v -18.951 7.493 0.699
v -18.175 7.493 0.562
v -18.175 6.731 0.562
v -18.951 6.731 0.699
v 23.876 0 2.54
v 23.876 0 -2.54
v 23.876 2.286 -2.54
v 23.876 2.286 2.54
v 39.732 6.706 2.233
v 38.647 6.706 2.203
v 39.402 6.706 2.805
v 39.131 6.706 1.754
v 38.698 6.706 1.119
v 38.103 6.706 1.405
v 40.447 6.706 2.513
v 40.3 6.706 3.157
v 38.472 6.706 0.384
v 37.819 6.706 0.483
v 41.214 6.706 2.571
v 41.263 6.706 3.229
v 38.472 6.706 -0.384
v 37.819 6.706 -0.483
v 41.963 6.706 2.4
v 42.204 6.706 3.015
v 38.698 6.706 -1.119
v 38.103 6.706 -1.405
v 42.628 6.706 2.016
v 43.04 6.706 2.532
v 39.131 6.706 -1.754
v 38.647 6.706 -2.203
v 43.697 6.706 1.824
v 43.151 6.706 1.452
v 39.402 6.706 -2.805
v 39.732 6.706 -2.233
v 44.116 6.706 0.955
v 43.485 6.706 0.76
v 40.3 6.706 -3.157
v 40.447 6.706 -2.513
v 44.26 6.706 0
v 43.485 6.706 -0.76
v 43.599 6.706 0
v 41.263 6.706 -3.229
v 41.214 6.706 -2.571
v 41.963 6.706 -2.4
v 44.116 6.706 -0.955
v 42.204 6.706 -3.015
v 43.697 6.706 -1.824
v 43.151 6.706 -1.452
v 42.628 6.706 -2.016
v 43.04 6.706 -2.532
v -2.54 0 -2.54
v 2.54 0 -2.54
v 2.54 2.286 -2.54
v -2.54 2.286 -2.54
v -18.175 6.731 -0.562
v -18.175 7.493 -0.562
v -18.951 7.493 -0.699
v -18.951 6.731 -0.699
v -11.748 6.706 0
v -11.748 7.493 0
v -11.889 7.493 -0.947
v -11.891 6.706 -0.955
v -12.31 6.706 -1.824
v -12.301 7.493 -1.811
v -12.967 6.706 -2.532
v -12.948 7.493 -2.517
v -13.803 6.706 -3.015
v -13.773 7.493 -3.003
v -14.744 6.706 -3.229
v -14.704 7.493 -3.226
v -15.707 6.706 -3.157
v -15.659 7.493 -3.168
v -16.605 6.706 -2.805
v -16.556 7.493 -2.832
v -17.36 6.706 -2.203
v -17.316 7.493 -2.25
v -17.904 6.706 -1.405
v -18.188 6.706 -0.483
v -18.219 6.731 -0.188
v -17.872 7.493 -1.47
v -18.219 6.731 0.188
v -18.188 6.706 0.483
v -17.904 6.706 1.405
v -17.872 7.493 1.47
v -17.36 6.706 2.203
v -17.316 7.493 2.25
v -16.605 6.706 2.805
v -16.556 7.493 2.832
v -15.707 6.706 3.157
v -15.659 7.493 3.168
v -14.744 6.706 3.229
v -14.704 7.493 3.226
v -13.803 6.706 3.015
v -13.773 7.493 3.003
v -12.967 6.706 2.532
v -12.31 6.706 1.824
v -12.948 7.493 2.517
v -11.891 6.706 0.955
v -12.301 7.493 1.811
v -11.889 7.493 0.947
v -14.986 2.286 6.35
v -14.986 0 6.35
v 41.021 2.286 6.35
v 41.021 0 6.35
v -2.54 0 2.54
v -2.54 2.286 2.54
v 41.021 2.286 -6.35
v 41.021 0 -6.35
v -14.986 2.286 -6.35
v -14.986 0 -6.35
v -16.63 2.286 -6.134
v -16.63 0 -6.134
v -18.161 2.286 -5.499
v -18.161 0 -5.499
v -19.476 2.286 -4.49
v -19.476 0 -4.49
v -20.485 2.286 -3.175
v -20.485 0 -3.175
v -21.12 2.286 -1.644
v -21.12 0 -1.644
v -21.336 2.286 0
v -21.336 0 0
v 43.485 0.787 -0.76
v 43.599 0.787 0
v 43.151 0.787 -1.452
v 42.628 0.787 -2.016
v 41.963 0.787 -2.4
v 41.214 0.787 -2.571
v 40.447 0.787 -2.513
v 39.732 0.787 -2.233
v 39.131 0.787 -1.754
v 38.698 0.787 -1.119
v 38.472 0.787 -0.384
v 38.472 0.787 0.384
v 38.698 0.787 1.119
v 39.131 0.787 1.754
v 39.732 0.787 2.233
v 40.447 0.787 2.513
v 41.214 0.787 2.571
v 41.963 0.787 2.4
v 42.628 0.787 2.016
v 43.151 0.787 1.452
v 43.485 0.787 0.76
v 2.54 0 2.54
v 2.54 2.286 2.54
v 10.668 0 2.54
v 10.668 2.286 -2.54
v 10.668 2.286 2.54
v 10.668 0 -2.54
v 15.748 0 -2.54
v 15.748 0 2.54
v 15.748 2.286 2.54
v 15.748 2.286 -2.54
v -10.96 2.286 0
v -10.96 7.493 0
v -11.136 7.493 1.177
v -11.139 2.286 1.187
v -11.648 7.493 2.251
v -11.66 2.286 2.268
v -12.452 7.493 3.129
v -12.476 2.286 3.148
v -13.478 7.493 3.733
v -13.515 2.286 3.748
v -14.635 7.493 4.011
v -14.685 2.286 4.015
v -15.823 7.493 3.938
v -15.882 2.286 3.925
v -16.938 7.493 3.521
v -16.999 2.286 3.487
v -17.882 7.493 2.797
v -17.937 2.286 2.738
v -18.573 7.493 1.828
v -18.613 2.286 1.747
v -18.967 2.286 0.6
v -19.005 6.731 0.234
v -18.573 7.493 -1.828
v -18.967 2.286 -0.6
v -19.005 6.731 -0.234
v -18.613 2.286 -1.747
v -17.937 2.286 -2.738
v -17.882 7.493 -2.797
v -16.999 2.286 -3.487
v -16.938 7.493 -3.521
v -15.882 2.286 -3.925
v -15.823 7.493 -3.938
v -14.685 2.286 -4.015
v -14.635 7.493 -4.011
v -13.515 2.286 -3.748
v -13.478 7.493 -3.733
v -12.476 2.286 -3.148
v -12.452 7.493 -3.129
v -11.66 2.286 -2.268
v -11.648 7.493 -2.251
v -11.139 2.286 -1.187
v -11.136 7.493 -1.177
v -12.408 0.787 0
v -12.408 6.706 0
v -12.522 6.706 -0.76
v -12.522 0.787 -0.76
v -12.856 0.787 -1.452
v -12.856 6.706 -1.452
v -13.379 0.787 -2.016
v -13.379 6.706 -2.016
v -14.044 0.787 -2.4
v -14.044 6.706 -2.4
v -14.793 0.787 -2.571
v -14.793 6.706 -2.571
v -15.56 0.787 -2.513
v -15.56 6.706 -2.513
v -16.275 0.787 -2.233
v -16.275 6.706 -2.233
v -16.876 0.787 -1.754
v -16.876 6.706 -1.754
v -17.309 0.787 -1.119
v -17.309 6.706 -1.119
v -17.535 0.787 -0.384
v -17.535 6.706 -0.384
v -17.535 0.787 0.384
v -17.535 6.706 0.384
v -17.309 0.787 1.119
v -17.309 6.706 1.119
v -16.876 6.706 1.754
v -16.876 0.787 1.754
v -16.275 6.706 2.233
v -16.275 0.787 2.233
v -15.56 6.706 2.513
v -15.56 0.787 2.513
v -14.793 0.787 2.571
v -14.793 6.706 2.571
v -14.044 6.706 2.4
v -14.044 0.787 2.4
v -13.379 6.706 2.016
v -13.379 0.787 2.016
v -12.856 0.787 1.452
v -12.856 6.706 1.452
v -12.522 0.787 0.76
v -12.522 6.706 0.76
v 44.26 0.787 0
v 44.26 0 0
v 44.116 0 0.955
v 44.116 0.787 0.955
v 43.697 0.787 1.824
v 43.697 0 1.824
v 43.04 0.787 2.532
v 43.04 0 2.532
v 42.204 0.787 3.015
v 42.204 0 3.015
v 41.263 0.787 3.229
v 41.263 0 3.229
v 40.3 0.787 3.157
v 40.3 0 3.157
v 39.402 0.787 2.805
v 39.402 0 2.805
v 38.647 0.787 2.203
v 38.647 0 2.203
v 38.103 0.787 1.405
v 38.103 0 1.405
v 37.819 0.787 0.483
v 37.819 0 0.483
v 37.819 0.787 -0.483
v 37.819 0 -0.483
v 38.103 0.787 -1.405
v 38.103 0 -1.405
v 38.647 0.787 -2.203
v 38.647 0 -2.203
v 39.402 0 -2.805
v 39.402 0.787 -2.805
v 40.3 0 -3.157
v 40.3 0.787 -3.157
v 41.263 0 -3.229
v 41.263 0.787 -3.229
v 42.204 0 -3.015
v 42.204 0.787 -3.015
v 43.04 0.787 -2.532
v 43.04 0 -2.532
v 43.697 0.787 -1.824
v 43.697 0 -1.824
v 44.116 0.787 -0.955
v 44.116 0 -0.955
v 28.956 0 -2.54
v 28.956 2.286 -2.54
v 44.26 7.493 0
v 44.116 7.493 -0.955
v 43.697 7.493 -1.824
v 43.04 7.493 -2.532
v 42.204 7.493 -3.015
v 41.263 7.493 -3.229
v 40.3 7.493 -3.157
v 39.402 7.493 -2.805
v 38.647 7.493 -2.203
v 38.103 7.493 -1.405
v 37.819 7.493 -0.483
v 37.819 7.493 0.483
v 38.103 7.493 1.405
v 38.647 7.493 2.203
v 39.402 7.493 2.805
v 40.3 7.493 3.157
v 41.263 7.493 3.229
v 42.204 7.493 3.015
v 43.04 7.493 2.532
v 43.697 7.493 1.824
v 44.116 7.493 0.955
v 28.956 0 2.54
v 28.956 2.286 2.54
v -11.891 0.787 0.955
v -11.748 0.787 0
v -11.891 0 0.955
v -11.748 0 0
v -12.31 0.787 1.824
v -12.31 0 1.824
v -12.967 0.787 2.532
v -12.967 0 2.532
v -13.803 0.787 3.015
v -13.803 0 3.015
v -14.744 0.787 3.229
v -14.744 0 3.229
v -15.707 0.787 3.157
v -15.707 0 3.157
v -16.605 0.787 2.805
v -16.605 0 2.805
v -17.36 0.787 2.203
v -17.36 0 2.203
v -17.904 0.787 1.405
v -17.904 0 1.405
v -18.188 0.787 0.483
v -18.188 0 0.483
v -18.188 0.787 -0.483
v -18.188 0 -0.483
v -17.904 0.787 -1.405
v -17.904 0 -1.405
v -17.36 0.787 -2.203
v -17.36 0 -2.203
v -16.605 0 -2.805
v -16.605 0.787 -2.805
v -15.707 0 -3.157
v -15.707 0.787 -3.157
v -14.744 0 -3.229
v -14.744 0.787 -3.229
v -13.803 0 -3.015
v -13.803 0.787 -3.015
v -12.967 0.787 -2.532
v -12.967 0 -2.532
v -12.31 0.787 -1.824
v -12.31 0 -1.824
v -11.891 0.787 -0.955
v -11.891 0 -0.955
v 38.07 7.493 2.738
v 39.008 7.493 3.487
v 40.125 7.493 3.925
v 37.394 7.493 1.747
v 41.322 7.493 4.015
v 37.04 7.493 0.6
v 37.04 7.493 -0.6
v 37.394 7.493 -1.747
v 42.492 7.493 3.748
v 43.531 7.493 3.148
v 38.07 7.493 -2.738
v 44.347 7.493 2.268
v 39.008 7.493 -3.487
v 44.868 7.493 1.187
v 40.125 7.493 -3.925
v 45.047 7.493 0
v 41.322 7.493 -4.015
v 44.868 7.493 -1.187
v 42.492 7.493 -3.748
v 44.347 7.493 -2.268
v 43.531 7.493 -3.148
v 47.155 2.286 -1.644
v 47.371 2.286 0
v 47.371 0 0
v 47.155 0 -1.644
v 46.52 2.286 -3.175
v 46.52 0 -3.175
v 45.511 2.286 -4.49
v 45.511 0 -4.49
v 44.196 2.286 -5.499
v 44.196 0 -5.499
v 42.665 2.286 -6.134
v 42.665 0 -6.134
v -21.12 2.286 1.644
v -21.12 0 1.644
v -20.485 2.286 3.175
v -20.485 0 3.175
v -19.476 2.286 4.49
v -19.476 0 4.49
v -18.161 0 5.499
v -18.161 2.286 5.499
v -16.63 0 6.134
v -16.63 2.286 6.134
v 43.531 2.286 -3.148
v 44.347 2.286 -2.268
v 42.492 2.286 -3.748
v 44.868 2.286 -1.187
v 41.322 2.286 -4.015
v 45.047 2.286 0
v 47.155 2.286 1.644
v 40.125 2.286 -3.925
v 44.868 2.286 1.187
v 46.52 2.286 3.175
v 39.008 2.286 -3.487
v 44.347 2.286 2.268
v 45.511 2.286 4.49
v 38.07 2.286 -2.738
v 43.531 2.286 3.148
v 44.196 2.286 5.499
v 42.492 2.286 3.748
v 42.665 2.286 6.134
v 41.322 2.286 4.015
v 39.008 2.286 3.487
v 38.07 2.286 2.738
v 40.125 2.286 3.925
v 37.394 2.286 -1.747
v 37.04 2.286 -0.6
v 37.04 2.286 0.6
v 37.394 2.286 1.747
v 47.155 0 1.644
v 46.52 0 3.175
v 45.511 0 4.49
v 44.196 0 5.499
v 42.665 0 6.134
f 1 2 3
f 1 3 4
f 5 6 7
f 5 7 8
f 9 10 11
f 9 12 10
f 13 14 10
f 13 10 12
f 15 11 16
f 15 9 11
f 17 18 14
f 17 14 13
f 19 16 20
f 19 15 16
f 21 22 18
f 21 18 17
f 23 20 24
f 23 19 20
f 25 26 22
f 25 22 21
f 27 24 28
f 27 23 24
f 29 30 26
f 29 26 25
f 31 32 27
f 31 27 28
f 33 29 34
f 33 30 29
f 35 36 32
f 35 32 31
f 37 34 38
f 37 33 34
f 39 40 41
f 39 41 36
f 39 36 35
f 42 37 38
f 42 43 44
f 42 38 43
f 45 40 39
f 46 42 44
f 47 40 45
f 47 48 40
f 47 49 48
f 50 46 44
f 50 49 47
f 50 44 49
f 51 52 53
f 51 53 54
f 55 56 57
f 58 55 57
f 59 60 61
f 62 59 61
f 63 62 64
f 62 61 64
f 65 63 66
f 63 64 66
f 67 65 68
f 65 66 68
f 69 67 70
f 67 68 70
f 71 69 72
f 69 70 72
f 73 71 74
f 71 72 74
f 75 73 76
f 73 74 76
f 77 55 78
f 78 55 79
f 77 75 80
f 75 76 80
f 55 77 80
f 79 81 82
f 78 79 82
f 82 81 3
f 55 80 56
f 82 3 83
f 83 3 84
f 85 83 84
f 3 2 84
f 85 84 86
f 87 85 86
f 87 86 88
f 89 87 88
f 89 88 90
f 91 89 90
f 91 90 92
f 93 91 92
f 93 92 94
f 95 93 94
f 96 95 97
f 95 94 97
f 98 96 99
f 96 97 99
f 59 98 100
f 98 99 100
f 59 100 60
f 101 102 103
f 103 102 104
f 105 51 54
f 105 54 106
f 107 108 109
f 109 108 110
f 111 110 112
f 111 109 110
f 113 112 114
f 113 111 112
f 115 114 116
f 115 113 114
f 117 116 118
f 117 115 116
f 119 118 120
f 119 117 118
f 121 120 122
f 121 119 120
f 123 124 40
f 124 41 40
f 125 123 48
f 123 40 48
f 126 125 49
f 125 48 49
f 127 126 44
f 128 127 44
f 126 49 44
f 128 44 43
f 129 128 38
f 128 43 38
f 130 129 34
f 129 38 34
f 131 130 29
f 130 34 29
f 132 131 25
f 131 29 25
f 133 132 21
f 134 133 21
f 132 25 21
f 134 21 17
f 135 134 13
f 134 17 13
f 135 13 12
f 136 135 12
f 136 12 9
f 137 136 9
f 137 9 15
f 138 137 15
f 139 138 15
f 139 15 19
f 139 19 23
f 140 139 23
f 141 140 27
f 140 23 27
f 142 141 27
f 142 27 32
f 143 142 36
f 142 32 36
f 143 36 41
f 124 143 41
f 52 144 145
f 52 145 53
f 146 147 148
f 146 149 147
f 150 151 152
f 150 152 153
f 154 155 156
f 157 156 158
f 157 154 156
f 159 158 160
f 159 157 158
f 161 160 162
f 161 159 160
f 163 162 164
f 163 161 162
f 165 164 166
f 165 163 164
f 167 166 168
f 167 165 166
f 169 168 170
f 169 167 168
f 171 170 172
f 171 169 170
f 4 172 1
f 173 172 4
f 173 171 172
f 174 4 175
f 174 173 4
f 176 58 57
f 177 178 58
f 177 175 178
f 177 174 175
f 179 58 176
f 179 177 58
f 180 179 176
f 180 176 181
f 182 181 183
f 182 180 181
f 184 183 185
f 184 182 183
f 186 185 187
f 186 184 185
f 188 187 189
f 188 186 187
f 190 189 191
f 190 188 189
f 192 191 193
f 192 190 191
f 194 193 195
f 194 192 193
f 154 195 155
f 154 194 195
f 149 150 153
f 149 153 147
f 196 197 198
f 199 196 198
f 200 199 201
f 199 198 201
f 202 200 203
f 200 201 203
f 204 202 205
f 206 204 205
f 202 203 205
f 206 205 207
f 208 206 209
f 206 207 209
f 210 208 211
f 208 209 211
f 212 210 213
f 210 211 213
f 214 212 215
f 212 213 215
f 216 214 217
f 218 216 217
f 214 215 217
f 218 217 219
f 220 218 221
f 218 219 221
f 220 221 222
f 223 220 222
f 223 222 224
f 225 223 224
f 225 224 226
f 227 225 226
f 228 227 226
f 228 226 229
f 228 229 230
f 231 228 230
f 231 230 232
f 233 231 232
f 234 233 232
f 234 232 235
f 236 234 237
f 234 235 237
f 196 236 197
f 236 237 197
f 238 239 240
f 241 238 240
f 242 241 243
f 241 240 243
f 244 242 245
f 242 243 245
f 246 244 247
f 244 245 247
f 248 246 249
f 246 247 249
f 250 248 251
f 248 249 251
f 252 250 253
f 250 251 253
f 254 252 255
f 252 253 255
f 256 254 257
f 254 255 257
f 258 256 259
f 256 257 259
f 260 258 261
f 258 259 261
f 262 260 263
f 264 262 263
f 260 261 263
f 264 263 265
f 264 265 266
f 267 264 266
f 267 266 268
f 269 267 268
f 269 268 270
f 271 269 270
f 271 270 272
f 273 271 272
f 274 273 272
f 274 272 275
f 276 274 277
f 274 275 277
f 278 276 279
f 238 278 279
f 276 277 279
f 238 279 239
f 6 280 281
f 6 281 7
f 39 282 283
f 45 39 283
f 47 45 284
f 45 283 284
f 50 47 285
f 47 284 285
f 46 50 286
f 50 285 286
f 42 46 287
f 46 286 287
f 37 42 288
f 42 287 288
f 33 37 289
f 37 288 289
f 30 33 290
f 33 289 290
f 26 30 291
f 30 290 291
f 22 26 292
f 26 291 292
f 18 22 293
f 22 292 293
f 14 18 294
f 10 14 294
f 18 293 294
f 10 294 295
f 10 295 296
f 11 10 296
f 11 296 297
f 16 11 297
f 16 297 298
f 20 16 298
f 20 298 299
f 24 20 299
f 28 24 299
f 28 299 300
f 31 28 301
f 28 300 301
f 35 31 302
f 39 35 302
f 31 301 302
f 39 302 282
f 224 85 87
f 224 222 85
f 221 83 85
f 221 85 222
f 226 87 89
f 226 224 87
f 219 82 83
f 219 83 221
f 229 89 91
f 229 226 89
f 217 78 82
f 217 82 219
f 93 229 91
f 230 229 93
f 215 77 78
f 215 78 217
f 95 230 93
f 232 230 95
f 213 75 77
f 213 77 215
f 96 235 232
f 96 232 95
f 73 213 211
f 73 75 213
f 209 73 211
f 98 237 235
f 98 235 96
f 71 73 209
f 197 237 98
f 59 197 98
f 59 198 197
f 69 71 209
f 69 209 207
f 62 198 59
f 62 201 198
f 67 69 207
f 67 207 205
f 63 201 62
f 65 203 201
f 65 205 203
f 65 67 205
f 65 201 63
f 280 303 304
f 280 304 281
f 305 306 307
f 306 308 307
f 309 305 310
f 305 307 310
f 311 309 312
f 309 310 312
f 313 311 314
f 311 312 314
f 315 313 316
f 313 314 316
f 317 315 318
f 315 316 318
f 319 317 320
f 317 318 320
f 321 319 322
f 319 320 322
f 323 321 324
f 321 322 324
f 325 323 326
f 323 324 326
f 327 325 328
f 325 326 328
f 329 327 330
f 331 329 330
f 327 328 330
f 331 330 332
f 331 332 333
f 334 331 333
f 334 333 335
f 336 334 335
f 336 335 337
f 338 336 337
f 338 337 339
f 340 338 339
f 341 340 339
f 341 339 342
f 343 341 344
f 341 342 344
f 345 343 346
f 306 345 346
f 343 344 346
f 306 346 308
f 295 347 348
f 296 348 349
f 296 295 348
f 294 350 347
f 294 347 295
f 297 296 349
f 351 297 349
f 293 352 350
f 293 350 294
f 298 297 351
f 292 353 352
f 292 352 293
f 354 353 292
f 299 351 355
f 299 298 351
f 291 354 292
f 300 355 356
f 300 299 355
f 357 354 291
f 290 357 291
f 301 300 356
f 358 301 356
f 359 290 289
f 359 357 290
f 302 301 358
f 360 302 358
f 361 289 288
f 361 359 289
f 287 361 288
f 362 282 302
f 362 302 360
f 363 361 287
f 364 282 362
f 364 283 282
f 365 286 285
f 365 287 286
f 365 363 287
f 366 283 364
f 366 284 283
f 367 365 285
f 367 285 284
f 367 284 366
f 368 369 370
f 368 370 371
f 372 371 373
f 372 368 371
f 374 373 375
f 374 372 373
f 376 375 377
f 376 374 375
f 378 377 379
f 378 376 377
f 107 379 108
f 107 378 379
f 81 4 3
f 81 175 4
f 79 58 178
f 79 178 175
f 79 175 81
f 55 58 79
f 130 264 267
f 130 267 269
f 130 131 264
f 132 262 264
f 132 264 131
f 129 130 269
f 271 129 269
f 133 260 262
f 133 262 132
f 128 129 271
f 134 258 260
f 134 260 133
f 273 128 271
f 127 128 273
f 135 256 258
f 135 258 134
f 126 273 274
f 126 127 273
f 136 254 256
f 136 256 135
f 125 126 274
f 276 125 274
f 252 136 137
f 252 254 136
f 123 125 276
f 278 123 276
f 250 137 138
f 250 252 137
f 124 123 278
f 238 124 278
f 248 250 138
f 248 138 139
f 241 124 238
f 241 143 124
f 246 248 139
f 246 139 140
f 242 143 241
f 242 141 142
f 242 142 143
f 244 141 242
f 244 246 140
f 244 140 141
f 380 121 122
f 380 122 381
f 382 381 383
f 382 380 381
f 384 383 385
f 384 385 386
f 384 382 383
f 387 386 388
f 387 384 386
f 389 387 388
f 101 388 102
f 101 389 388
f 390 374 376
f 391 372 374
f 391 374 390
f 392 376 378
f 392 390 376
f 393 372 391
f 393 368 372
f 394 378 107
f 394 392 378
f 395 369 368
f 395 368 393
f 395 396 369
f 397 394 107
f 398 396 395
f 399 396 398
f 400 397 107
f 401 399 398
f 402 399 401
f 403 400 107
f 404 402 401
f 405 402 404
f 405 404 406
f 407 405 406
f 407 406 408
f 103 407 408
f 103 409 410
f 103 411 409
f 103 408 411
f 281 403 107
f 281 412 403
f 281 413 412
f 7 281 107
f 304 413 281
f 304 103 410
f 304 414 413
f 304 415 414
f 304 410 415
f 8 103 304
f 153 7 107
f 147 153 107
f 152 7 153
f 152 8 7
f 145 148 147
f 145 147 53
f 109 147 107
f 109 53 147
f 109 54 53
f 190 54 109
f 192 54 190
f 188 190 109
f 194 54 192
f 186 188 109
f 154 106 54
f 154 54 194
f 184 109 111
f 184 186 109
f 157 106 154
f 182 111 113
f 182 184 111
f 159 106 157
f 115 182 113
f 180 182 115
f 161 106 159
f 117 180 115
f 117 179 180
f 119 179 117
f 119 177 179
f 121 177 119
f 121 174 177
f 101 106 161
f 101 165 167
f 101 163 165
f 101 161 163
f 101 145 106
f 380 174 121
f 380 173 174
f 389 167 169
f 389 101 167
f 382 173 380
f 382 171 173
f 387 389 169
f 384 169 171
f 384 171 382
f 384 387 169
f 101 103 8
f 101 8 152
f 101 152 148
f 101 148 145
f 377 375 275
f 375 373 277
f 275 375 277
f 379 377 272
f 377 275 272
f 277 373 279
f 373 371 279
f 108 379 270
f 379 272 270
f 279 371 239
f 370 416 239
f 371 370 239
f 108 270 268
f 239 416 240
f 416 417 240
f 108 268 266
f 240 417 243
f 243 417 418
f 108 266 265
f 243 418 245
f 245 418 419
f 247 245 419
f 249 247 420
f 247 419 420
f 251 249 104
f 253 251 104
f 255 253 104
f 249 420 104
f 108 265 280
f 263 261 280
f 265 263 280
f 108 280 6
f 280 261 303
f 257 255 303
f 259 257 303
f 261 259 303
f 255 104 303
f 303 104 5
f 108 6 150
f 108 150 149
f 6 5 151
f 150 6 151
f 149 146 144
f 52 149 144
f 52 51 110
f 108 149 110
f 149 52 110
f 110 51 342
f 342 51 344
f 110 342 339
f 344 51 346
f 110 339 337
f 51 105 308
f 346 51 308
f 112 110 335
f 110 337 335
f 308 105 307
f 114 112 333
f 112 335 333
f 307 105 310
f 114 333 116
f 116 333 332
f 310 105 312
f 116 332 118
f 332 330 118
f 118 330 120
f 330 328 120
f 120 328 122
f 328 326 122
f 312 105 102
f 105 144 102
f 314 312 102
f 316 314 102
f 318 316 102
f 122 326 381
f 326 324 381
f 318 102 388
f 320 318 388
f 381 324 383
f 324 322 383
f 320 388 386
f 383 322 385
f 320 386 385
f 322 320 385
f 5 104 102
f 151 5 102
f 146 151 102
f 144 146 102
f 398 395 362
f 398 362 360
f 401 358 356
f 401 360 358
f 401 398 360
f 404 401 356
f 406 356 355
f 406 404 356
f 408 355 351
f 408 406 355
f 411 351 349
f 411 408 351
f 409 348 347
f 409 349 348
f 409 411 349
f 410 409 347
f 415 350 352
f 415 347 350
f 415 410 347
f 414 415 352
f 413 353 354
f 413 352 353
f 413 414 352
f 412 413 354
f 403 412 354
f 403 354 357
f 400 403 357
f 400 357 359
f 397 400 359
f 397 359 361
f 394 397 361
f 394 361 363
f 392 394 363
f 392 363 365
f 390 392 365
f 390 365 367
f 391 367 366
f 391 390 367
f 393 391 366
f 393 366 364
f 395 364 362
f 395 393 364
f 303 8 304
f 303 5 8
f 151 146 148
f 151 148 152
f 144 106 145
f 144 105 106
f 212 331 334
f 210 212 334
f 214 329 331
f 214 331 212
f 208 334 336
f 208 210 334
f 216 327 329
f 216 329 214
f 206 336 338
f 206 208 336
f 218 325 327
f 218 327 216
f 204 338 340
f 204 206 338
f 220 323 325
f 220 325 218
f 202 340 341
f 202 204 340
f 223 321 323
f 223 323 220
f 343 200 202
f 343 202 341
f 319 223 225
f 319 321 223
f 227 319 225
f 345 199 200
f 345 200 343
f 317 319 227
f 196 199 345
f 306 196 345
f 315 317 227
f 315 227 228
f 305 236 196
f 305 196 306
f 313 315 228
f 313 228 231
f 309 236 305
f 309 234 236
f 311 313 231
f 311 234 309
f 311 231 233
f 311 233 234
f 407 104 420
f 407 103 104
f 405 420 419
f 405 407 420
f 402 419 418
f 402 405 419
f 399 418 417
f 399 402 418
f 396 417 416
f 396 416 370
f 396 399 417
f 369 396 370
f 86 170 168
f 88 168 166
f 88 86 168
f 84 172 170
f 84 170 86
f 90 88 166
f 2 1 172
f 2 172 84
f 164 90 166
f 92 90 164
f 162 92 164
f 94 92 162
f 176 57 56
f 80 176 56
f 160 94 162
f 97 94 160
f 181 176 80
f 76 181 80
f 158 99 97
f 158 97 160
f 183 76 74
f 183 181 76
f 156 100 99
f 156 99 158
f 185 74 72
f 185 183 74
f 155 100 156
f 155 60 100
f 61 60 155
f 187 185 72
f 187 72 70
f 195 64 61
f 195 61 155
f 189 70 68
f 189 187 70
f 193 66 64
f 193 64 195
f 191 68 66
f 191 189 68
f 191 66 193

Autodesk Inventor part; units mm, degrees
ref_plane "YZ Plane" through (0, 0, 0) normal (1, 0, 0) x (0, 1, 0)
ref_plane "XZ Plane" through (0, 0, 0) normal (0, 1, 0) x (-1, 0, 0)
ref_plane "XY Plane" through (0, 0, 0) normal (0, 0, 1) x (1, 0, 0)
sketch "Sketch1" plane through (0, 0, 0) normal (0, 1, 0) x (-1, 0, 0)
  line L0 (21.336, 6.35) -> (-47.371, 6.35)
  line L1 (-47.371, 6.35) -> (-47.371, -6.35)
  line L2 (-47.371, -6.35) -> (21.336, -6.35)
  line L3 (21.336, -6.35) -> (21.336, 6.35)
  line L4 (-2.54, -2.54) -> (2.54, -2.54)
  line L5 (2.54, -2.54) -> (2.54, 2.54)
  line L6 (2.54, 2.54) -> (-2.54, 2.54)
  line L7 (-2.54, 2.54) -> (-2.54, -2.54)
  line L8 (-2.54, -2.54) -> (2.54, 2.54) construction
  line L9 (2.54, -2.54) -> (-2.54, 2.54) construction
  line L10 (-10.668, 2.54) -> (-15.748, 2.54)
  line L11 (-15.748, 2.54) -> (-15.748, -2.54)
  line L12 (-15.748, -2.54) -> (-10.668, -2.54)
  line L13 (-10.668, -2.54) -> (-10.668, 2.54)
  line L14 (-10.668, 2.54) -> (-15.748, -2.54) construction
  line L15 (-15.748, 2.54) -> (-10.668, -2.54) construction
  line L16 (-23.876, 2.54) -> (-28.956, 2.54)
  line L17 (-28.956, 2.54) -> (-28.956, -2.54)
  line L18 (-28.956, -2.54) -> (-23.876, -2.54)
  line L19 (-23.876, -2.54) -> (-23.876, 2.54)
  line L20 (-23.876, 2.54) -> (-28.956, -2.54) construction
  line L21 (-28.956, 2.54) -> (-23.876, -2.54) construction
  point P0 (0, 0)
  point P1 (-13.208, 0)
  point P2 (-26.416, 0)
  dimension "d0" = 68.707
  dimension "d1" = 12.7
  dimension "d2" = 5.08
  dimension "d3" = 5.08
  dimension "d4" = 5.08
  dimension "d5" = 5.08
  dimension "d6" = 13.208
  dimension "d7" = 13.208
  dimension "d8" = 6.35
  dimension "d9" = 21.336
  dimension "d37" = 5.08
  dimension "d38" = 5.08
extrude "Extrusion1" add sketch "Sketch1" along normal blind 2.286
sketch "Sketch2" plane through (0, 2.286, 0) normal (0, 1, 0) x (1, 0, 0)
  line L0 (-21.336, 6.35) -> (-21.336, -6.35) projected
  circle A0 centre (-14.986, 0) radius 4.0259
  point P0 (0, 0)
  dimension "d12" = 6.35
  dimension "d13" = 8.0518
extrude "Extrusion2" add sketch "Sketch2" along normal blind 5.207
sketch "Sketch3" plane through (-14.986, 7.493, 0) normal (0, 1, 0) x (1, 0, 0)
  circle A0 centre (0, 0) radius 3.2385
  point P0 (14.986, 0)
  dimension "d16" = 6.477
extrude "Extrusion3" cut sketch "Sketch3" against normal blind 0.7874
sketch "Sketch4" plane through (0, 0, 0) normal (0, -1, 0) x (1, 0, 0)
  circle A0 centre (-14.986, 0) radius 3.2385 projected
  circle A1 centre (-14.986, 0) radius 3.2385
  point P0 (0, 0)
  dimension "d39" = 6.477
extrude "Extrusion4" cut sketch "Sketch4" against normal blind 0.7874
sketch "Sketch5" plane through (-14.986, 6.7056, 0) normal (0, 1, 0) x (1, 0, 0)
  circle A0 centre (0, 0) radius 2.5781
  point P0 (14.986, 0)
  dimension "d21" = 5.1562
extrude "Extrusion5" cut sketch "Sketch5" against normal through all
sketch "Sketch6" plane through (0, 2.286, 0) normal (0, 1, 0) x (1, 0, 0)
  line L0 (47.371, -6.35) -> (47.371, 6.35) projected
  circle A0 centre (41.021, 0) radius 4.0259
  point P0 (0, 0)
  dimension "d24" = 6.35
  dimension "d25" = 8.0518
extrude "Extrusion6" add sketch "Sketch6" along normal blind 5.207
sketch "Sketch7" plane through (41.021, 7.493, 0) normal (0, 1, 0) x (1, 0, 0)
  circle A0 centre (0, 0) radius 3.2385
  point P0 (-41.021, 0)
  dimension "d28" = 6.477
extrude "Extrusion7" cut sketch "Sketch7" against normal blind 0.7874
sketch "Sketch8" plane through (0, 0, 0) normal (0, -1, 0) x (1, 0, 0)
  circle A0 centre (41.021, 0) radius 3.2385 projected
  circle A1 centre (41.021, 0) radius 3.2385
  point P0 (0, 0)
  dimension "d40" = 6.477
extrude "Extrusion8" cut sketch "Sketch8" against normal blind 0.7874
sketch "Sketch9" plane through (41.021, 6.7056, 0) normal (0, 1, 0) x (1, 0, 0)
  circle A0 centre (0, 0) radius 2.5781
  point P0 (-41.021, 0)
  dimension "d33" = 5.1562
extrude "Extrusion9" cut sketch "Sketch9" against normal through all
fillet "Fillet1" radius 6.35 4 edges at (47.371, 1.143, 6.35) (47.371, 1.143, -6.35) (-21.336, 1.143, 6.35) (-21.336, 1.143, -6.35)
sketch "Sketch12" plane through (-14.986, 7.493, 0) normal (0, 1, 0) x (1, 0, 0)
  circle A0 centre (0, 0) radius 4.0259 projected
  line L0 (0, 0) -> (4.0259, 0) construction
  line L1 (0, 0) -> (4.0259, 0) construction
  circle A1 centre (0, 0) radius 3.2385 projected
  line L2 (-3.1893, 0.5624) -> (-3.9647, 0.6991)
  line L3 (-3.1893, -0.5624) -> (-3.9647, -0.6991)
  arc A2 (-3.1893, 0.5624) -> (-3.1893, -0.5624) centre (0, 0) ccw
  arc A3 (-3.9647, 0.6991) -> (-3.9647, -0.6991) centre (0, 0) ccw
  point P0 (14.986, 0)
  point P1 (-2.9392, 0.5183)
extrude "Extrusion11" cut sketch "Sketch12" against normal blind 0.762 contours L2 A1 L3 A0 picked at (-3.7571, 0.0628)
properties part number "VexLegoMountThick2"
